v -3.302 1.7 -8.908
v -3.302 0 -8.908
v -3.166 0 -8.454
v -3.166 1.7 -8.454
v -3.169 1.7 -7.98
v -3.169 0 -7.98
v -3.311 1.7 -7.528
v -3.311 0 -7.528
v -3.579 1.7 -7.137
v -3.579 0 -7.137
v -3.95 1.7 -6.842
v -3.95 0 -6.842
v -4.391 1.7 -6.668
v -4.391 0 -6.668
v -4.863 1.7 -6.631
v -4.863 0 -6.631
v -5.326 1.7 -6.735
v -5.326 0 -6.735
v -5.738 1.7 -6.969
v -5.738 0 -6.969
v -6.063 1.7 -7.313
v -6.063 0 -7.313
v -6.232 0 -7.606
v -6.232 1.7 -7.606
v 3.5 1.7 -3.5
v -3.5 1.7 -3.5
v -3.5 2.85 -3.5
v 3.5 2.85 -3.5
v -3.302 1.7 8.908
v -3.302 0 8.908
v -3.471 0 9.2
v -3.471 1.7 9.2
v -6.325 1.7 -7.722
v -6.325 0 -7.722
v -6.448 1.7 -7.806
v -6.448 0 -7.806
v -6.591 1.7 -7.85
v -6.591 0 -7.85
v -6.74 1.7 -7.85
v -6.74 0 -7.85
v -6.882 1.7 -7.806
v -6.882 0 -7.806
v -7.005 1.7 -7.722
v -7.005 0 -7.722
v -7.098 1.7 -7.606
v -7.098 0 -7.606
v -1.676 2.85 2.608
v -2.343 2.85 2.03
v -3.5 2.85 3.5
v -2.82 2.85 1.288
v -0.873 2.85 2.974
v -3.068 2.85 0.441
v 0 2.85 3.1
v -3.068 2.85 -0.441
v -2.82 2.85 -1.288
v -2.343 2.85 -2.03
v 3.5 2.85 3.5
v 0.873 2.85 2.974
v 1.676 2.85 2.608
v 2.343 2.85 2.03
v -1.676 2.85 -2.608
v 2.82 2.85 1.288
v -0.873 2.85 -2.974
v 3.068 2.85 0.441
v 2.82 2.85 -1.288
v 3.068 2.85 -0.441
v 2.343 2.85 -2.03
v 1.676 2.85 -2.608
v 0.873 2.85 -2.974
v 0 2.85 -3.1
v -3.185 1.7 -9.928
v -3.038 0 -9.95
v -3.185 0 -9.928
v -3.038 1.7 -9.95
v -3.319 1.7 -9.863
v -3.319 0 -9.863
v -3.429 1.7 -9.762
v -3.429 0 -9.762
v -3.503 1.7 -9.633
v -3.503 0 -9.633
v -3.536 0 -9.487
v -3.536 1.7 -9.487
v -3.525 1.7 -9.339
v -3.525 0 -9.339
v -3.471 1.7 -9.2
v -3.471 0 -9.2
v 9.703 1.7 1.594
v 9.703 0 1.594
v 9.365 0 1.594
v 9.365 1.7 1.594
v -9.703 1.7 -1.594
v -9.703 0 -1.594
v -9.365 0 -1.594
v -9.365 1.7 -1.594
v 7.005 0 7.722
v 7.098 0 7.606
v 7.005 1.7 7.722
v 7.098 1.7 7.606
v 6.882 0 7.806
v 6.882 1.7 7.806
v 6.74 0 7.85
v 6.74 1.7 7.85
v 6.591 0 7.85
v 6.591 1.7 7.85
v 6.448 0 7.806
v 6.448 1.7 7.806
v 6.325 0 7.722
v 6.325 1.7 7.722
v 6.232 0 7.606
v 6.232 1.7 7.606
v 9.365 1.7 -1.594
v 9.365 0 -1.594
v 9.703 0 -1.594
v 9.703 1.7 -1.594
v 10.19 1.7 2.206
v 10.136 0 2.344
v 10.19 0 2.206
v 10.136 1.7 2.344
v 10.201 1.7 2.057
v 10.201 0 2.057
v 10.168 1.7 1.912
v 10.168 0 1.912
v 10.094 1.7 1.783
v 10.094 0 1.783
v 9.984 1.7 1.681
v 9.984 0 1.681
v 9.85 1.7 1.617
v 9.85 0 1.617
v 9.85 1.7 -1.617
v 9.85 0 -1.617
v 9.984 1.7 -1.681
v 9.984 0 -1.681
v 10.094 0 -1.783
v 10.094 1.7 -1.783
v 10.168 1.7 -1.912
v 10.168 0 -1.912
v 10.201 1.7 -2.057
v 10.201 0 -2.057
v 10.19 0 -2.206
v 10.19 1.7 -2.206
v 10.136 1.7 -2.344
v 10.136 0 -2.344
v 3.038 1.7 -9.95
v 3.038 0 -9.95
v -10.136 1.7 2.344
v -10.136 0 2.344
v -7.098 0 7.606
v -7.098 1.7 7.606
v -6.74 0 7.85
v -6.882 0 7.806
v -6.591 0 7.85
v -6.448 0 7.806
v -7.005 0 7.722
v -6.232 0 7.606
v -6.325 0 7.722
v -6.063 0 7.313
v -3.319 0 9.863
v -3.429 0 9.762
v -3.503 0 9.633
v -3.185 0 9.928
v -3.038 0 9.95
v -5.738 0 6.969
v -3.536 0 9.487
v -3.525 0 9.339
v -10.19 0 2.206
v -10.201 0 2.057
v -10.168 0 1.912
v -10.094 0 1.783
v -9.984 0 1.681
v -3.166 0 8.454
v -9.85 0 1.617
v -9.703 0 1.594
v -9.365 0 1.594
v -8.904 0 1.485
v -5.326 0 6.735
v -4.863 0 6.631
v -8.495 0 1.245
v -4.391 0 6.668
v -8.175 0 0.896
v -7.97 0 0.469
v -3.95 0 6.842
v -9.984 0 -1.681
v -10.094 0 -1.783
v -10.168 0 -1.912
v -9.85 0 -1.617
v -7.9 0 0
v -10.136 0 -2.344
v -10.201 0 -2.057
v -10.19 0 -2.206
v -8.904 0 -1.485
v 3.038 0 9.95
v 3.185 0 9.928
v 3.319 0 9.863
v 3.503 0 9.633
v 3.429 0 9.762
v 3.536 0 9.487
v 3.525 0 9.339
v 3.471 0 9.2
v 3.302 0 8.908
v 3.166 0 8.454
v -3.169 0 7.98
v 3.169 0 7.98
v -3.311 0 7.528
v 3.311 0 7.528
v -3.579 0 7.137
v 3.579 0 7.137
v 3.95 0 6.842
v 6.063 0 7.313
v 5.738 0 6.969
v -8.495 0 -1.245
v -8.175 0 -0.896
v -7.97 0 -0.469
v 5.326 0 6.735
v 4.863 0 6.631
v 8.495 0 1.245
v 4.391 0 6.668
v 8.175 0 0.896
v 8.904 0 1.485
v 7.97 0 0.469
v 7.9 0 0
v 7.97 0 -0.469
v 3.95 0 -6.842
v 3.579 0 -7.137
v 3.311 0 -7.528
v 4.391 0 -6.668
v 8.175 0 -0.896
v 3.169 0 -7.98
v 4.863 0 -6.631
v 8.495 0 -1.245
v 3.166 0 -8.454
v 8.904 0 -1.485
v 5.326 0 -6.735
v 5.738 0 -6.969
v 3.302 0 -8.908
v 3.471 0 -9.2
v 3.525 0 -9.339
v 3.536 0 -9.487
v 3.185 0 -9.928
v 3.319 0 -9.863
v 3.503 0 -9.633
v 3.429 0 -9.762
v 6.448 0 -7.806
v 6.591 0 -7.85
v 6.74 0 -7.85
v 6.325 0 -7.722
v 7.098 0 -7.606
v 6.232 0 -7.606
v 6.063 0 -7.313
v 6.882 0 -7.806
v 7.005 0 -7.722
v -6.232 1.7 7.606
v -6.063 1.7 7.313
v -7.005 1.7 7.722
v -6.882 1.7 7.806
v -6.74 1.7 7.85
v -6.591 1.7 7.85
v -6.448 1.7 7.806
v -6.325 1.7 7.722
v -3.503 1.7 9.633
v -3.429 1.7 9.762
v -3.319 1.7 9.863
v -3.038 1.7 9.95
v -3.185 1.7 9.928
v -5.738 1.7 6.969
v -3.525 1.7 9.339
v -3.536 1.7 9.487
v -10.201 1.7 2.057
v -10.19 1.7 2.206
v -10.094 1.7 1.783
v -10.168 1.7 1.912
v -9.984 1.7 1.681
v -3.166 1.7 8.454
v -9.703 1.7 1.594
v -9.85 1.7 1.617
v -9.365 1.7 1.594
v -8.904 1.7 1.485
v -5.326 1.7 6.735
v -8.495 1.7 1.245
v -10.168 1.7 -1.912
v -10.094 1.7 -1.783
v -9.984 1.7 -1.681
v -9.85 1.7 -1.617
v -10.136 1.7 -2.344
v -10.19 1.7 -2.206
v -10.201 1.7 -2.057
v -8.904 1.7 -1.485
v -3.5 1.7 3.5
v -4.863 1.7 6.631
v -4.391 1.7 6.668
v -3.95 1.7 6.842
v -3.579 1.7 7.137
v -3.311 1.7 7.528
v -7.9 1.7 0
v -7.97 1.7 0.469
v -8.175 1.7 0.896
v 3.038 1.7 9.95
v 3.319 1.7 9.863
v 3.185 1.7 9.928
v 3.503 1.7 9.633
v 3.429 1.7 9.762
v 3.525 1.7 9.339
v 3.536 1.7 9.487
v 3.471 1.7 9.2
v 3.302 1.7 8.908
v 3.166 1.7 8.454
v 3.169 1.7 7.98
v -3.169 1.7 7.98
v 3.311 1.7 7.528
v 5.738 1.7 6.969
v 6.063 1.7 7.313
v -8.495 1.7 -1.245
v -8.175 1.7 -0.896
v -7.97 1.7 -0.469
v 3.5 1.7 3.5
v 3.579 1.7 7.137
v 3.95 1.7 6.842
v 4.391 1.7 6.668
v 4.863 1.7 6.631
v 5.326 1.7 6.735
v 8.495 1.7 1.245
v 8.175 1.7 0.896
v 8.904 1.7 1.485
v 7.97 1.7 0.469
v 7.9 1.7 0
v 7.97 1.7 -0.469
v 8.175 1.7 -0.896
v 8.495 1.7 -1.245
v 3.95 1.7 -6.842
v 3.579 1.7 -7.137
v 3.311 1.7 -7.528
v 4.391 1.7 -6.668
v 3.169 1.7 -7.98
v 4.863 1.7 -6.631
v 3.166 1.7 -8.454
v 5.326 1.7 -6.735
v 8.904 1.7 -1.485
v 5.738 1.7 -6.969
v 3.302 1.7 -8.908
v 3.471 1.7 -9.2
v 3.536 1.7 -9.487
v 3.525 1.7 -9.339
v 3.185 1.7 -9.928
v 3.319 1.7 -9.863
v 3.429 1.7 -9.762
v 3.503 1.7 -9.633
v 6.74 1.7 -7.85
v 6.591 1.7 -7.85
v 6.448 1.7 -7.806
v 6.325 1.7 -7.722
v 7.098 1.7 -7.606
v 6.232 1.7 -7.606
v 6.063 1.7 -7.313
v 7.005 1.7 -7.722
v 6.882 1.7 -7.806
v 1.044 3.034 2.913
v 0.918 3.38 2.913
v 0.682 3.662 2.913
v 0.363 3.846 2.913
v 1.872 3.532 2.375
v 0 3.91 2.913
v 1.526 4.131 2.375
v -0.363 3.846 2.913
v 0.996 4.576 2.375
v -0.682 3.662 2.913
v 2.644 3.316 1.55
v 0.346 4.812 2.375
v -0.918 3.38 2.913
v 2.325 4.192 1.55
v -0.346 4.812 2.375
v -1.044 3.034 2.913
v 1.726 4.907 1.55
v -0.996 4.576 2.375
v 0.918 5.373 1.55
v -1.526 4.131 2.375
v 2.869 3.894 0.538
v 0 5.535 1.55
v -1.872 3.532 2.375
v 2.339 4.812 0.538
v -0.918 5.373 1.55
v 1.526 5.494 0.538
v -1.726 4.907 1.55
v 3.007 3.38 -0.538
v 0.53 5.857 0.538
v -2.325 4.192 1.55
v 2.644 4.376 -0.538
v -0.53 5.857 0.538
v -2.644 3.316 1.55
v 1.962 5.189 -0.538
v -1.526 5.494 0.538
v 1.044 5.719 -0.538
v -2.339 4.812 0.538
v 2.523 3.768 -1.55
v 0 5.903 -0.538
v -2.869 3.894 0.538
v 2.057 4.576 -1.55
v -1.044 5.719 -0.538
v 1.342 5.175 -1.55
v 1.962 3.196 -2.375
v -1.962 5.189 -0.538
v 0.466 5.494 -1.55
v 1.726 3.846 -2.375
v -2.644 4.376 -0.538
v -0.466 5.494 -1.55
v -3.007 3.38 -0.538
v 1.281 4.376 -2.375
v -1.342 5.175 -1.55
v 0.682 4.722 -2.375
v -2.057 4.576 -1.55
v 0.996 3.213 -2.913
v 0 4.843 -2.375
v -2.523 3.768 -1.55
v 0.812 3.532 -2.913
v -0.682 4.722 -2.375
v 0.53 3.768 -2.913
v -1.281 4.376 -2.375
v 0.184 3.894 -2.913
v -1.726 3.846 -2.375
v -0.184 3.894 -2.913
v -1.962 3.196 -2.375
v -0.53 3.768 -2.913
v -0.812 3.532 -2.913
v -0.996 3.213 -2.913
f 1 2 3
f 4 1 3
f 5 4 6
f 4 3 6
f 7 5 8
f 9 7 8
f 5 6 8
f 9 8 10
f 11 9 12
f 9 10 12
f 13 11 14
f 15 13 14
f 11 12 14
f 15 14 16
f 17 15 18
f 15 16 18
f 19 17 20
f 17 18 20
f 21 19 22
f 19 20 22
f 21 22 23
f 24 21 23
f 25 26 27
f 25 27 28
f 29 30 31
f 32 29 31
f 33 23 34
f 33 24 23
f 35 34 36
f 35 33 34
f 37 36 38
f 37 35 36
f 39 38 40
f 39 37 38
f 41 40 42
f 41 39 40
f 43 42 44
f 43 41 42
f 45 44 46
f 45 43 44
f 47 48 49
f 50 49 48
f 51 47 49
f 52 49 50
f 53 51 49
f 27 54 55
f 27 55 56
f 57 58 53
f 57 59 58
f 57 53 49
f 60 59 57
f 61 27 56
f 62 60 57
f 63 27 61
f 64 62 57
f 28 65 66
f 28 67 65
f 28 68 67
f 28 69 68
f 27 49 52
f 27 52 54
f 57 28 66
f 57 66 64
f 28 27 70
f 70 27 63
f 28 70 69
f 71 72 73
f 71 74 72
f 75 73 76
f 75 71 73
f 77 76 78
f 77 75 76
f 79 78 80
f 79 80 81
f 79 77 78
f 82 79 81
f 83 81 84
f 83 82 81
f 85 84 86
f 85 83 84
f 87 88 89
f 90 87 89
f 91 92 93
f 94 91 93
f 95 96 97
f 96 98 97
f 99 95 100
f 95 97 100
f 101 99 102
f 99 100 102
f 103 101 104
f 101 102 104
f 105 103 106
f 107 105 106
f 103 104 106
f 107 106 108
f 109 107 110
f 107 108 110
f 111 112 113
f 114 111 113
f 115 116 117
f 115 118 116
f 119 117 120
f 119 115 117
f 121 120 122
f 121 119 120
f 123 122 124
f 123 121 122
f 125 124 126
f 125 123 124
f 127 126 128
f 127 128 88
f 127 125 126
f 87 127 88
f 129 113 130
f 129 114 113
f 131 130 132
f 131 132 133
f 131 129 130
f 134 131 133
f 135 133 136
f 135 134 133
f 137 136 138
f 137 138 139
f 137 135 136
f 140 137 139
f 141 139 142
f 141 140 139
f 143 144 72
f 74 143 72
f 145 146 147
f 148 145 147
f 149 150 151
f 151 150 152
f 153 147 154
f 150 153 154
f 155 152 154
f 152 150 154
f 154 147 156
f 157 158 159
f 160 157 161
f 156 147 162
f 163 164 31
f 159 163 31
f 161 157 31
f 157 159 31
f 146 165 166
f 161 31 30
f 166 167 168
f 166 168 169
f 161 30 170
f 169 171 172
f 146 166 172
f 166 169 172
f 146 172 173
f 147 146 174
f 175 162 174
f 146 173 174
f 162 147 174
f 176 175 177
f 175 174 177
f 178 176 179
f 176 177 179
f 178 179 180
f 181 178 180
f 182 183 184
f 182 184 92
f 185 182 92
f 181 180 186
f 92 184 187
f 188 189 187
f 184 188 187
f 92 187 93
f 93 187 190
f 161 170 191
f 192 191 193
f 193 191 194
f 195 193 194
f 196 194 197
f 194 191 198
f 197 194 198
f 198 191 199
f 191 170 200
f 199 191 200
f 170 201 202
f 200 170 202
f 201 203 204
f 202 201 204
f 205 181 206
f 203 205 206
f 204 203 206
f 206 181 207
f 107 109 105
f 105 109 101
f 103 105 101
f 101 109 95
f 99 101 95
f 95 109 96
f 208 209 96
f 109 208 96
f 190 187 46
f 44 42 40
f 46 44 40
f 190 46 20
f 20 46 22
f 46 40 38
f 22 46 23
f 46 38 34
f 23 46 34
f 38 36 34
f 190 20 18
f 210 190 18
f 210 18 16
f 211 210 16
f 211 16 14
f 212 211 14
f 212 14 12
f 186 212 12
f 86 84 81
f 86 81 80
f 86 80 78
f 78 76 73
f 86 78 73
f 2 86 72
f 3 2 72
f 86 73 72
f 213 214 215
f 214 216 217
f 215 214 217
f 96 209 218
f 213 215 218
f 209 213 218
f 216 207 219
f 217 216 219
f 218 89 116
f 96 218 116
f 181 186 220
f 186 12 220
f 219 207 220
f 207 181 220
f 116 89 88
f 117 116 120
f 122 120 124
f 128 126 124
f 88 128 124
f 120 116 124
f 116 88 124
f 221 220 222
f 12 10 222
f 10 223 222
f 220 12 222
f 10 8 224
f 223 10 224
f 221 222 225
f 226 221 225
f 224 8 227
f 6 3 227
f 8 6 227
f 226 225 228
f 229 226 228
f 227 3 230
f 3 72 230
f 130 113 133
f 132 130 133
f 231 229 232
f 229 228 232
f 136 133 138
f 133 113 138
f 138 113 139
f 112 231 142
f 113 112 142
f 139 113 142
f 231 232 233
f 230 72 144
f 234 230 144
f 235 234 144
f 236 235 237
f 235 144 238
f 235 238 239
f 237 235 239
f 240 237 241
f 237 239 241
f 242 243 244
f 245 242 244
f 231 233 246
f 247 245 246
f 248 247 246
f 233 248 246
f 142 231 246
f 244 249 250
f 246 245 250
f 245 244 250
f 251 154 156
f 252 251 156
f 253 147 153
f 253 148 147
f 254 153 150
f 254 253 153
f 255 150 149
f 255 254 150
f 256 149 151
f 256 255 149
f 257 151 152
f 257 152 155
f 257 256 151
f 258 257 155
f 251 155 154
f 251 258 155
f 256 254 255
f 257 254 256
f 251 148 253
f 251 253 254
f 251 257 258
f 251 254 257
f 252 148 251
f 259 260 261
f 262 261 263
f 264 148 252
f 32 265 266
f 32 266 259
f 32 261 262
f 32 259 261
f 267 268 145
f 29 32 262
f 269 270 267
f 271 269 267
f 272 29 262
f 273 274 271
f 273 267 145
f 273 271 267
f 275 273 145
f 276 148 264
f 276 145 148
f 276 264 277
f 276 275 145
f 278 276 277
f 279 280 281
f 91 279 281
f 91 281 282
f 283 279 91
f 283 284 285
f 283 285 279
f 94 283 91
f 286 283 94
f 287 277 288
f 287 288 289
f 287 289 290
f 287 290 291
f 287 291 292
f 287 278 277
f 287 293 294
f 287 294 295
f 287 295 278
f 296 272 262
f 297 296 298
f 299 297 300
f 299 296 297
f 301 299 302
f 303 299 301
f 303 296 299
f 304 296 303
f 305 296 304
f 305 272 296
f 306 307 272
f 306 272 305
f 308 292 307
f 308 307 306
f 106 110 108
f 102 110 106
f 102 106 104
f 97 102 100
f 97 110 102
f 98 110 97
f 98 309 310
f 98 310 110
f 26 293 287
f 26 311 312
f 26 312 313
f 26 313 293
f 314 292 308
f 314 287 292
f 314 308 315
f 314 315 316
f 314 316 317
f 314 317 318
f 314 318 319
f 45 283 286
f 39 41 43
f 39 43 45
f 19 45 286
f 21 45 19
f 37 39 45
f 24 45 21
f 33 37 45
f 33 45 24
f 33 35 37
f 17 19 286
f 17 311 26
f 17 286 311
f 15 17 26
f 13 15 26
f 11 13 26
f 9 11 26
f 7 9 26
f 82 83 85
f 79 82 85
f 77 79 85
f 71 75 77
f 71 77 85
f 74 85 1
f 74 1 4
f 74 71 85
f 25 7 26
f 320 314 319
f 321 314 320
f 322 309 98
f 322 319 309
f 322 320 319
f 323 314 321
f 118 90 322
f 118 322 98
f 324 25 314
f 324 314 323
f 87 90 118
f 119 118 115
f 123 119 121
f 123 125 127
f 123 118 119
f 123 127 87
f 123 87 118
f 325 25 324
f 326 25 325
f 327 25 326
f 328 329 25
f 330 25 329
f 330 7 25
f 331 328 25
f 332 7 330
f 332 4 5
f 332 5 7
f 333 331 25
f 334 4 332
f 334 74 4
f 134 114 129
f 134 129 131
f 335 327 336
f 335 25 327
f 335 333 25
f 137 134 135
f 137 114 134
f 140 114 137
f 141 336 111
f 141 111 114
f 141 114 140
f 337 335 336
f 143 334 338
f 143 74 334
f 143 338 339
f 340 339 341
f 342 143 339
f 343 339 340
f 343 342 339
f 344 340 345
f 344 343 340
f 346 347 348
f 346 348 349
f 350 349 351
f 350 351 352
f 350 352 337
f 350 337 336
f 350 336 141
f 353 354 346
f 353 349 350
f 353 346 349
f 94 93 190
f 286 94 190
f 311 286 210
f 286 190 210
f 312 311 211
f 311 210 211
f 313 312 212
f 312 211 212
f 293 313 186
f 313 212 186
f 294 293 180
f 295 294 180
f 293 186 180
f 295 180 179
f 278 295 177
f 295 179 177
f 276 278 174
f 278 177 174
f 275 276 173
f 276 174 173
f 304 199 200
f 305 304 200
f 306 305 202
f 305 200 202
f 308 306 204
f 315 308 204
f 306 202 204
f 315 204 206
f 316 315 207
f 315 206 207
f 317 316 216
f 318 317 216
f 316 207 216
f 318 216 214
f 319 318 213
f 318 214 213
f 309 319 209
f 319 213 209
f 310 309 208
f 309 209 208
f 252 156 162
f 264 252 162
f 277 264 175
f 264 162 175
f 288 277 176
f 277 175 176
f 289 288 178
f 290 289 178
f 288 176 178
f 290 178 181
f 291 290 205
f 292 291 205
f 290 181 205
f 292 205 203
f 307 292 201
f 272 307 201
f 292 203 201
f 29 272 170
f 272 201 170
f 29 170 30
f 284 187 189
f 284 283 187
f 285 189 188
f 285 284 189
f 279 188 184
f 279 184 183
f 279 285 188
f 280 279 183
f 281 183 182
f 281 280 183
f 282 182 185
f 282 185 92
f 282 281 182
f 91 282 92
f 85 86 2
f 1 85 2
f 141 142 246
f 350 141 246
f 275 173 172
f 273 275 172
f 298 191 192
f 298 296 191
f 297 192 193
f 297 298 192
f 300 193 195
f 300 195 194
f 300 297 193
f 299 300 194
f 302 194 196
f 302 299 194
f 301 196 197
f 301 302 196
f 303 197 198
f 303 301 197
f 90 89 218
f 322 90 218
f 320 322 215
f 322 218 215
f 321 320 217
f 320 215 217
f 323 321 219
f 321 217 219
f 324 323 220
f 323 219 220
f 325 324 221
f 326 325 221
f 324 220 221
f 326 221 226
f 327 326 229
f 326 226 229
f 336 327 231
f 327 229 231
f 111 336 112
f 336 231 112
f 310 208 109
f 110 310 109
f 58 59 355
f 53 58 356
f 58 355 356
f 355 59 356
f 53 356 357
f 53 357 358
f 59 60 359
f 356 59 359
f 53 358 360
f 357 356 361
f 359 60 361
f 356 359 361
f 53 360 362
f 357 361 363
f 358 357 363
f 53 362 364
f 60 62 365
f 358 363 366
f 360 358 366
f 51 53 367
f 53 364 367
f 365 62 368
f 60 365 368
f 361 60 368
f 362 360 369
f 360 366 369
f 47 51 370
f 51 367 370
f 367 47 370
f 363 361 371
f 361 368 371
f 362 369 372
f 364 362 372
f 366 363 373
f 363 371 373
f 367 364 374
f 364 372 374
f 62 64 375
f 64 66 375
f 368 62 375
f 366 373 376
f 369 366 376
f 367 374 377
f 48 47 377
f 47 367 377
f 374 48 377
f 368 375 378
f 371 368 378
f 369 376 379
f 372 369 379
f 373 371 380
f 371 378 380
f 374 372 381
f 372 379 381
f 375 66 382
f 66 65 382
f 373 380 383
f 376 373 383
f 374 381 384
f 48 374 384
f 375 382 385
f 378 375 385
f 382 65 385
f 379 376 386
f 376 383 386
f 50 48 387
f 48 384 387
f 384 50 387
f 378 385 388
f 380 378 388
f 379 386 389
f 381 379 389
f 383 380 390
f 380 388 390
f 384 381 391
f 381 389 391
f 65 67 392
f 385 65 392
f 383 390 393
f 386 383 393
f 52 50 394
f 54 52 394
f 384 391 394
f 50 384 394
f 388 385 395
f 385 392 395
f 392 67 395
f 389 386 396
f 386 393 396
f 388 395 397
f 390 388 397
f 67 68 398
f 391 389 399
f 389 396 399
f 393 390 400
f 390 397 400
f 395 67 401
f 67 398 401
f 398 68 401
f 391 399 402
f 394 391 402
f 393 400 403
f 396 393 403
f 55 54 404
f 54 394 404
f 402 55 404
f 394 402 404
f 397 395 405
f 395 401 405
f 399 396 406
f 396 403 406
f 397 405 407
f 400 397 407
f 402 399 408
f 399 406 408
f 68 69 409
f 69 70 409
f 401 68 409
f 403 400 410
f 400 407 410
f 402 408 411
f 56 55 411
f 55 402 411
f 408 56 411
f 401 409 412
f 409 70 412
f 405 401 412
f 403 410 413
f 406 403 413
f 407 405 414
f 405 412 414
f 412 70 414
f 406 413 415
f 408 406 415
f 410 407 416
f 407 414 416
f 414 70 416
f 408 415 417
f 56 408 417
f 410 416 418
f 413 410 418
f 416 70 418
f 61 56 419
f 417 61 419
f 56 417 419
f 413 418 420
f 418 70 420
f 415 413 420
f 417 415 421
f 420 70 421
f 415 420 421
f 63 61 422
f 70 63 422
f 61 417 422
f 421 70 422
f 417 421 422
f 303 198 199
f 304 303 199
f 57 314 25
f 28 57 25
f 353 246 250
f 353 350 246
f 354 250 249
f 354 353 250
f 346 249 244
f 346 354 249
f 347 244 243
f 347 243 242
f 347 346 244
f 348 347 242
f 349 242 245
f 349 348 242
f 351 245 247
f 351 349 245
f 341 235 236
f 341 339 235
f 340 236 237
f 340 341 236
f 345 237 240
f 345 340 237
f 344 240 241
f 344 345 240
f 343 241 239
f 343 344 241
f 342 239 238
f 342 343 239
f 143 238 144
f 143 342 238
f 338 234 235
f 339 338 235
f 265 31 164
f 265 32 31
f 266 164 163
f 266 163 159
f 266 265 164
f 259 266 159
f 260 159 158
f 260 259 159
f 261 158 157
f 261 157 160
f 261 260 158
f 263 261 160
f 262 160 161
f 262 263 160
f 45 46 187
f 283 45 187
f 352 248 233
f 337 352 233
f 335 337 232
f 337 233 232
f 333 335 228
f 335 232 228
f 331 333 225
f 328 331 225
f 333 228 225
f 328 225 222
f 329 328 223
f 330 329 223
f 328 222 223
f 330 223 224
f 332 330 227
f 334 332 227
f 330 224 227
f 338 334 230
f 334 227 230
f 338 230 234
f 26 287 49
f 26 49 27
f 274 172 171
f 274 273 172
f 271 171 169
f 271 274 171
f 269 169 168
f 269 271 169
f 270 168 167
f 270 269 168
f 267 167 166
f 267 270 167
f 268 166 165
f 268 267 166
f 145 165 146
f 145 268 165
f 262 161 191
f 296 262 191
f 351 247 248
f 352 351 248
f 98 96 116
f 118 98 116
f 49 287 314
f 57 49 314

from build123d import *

# Parameters (mm, degrees)
BOSS_EXTRUDE1_DEPTH = 1.7
FILLET1_R           = 0.5
SKETCH4_W           = 7
SKETCH4_H           = 7
BOSS_EXTRUDE2_DEPTH = 1.15
REVOLVE4_ANGLE      = 180


with BuildPart() as part:
    # Sketch1 → Boss-Extrude1 (new body)
    with BuildSketch(Plane(origin=(0, 0, 0), x_dir=(1, 0, 0), z_dir=(0, 1, 0))):
        with BuildLine():
            Line((6.665114398, -8.355683224), (10.568791137, -1.594316776))
            Line((10.568791137, -1.594316776), (9.365263158, -1.594316776))
            ThreePointArc((9.365263158, -1.594316776), (7.9, 0), (9.365263158, 1.594316776))
            Line((9.365263158, 1.594316776), (10.568791137, 1.594316776))
            Line((10.568791137, 1.594316776), (6.665114398, 8.355683224))
            Line((6.665114398, 8.355683224), (6.063350409, 7.31339742))
            ThreePointArc((6.063350409, 7.31339742), (3.95, 6.84160069), (3.301912749, 8.907714196))
            Line((3.301912749, 8.907714196), (3.903676738, 9.95))
            Line((3.903676738, 9.95), (-3.903676738, 9.95))
            Line((-3.903676738, 9.95), (-3.301912749, 8.907714196))
            ThreePointArc((-3.301912749, 8.907714196), (-3.95, 6.84160069), (-6.063350409, 7.31339742))
            Line((-6.063350409, 7.31339742), (-6.665114398, 8.355683224))
            Line((-6.665114398, 8.355683224), (-10.568791137, 1.594316776))
            Line((-10.568791137, 1.594316776), (-9.365263158, 1.594316776))
            ThreePointArc((-9.365263158, 1.594316776), (-7.9, 0), (-9.365263158, -1.594316776))
            Line((-9.365263158, -1.594316776), (-10.568791137, -1.594316776))
            Line((-10.568791137, -1.594316776), (-6.665114398, -8.355683224))
            Line((-6.665114398, -8.355683224), (-6.063350409, -7.31339742))
            ThreePointArc((-6.063350409, -7.31339742), (-3.95, -6.84160069), (-3.301912749, -8.907714196))
            Line((-3.301912749, -8.907714196), (-3.903676738, -9.95))
            Line((-3.903676738, -9.95), (3.903676738, -9.95))
            Line((3.903676738, -9.95), (3.301912749, -8.907714196))
            ThreePointArc((3.301912749, -8.907714196), (3.95, -6.84160069), (6.063350409, -7.31339742))
            Line((6.063350409, -7.31339742), (6.665114398, -8.355683224))
        make_face()
    extrude(amount=BOSS_EXTRUDE1_DEPTH)

    # Fillet1
    fillet1_edges = [part.edges().sort_by_distance(p)[0] for p in [
        (-6.665114398, 0.85, 8.355683224),
        (-10.568791137, 0.85, 1.594316776),
        (-10.568791137, 0.85, -1.594316776),
        (-6.665114398, 0.85, -8.355683224),
        (-3.903676738, 0.85, -9.95),
        (3.903676738, 0.85, -9.95),
        (6.665114398, 0.85, -8.355683224),
        (10.568791137, 0.85, -1.594316776),
        (10.568791137, 0.85, 1.594316776),
        (6.665114398, 0.85, 8.355683224),
        (3.903676738, 0.85, 9.95),
        (-3.903676738, 0.85, 9.95),
    ]]
    fillet(fillet1_edges, radius=FILLET1_R)

    # Sketch4 → Boss-Extrude2 (add)
    with BuildSketch(Plane(origin=(0, 1.7, 0), x_dir=(1, 0, 0), z_dir=(0, 1, 0))):
        Rectangle(SKETCH4_W, SKETCH4_H)
    extrude(amount=BOSS_EXTRUDE2_DEPTH)

    # Sketch5 → Revolve4 (revolve)
    with BuildSketch(Plane(origin=(0, 2.85, 0), x_dir=(1, 0, 0), z_dir=(0, 1, 0))):
        with BuildLine():
            Line((0, 3.1), (0, -3.1))
            ThreePointArc((0, -3.1), (3.1, 0), (0, 3.1))
        make_face()
    revolve(axis=Axis((0, 2.85, -3.1), (0, 0, 1)), revolution_arc=REVOLVE4_ANGLE)


solid = part.part
